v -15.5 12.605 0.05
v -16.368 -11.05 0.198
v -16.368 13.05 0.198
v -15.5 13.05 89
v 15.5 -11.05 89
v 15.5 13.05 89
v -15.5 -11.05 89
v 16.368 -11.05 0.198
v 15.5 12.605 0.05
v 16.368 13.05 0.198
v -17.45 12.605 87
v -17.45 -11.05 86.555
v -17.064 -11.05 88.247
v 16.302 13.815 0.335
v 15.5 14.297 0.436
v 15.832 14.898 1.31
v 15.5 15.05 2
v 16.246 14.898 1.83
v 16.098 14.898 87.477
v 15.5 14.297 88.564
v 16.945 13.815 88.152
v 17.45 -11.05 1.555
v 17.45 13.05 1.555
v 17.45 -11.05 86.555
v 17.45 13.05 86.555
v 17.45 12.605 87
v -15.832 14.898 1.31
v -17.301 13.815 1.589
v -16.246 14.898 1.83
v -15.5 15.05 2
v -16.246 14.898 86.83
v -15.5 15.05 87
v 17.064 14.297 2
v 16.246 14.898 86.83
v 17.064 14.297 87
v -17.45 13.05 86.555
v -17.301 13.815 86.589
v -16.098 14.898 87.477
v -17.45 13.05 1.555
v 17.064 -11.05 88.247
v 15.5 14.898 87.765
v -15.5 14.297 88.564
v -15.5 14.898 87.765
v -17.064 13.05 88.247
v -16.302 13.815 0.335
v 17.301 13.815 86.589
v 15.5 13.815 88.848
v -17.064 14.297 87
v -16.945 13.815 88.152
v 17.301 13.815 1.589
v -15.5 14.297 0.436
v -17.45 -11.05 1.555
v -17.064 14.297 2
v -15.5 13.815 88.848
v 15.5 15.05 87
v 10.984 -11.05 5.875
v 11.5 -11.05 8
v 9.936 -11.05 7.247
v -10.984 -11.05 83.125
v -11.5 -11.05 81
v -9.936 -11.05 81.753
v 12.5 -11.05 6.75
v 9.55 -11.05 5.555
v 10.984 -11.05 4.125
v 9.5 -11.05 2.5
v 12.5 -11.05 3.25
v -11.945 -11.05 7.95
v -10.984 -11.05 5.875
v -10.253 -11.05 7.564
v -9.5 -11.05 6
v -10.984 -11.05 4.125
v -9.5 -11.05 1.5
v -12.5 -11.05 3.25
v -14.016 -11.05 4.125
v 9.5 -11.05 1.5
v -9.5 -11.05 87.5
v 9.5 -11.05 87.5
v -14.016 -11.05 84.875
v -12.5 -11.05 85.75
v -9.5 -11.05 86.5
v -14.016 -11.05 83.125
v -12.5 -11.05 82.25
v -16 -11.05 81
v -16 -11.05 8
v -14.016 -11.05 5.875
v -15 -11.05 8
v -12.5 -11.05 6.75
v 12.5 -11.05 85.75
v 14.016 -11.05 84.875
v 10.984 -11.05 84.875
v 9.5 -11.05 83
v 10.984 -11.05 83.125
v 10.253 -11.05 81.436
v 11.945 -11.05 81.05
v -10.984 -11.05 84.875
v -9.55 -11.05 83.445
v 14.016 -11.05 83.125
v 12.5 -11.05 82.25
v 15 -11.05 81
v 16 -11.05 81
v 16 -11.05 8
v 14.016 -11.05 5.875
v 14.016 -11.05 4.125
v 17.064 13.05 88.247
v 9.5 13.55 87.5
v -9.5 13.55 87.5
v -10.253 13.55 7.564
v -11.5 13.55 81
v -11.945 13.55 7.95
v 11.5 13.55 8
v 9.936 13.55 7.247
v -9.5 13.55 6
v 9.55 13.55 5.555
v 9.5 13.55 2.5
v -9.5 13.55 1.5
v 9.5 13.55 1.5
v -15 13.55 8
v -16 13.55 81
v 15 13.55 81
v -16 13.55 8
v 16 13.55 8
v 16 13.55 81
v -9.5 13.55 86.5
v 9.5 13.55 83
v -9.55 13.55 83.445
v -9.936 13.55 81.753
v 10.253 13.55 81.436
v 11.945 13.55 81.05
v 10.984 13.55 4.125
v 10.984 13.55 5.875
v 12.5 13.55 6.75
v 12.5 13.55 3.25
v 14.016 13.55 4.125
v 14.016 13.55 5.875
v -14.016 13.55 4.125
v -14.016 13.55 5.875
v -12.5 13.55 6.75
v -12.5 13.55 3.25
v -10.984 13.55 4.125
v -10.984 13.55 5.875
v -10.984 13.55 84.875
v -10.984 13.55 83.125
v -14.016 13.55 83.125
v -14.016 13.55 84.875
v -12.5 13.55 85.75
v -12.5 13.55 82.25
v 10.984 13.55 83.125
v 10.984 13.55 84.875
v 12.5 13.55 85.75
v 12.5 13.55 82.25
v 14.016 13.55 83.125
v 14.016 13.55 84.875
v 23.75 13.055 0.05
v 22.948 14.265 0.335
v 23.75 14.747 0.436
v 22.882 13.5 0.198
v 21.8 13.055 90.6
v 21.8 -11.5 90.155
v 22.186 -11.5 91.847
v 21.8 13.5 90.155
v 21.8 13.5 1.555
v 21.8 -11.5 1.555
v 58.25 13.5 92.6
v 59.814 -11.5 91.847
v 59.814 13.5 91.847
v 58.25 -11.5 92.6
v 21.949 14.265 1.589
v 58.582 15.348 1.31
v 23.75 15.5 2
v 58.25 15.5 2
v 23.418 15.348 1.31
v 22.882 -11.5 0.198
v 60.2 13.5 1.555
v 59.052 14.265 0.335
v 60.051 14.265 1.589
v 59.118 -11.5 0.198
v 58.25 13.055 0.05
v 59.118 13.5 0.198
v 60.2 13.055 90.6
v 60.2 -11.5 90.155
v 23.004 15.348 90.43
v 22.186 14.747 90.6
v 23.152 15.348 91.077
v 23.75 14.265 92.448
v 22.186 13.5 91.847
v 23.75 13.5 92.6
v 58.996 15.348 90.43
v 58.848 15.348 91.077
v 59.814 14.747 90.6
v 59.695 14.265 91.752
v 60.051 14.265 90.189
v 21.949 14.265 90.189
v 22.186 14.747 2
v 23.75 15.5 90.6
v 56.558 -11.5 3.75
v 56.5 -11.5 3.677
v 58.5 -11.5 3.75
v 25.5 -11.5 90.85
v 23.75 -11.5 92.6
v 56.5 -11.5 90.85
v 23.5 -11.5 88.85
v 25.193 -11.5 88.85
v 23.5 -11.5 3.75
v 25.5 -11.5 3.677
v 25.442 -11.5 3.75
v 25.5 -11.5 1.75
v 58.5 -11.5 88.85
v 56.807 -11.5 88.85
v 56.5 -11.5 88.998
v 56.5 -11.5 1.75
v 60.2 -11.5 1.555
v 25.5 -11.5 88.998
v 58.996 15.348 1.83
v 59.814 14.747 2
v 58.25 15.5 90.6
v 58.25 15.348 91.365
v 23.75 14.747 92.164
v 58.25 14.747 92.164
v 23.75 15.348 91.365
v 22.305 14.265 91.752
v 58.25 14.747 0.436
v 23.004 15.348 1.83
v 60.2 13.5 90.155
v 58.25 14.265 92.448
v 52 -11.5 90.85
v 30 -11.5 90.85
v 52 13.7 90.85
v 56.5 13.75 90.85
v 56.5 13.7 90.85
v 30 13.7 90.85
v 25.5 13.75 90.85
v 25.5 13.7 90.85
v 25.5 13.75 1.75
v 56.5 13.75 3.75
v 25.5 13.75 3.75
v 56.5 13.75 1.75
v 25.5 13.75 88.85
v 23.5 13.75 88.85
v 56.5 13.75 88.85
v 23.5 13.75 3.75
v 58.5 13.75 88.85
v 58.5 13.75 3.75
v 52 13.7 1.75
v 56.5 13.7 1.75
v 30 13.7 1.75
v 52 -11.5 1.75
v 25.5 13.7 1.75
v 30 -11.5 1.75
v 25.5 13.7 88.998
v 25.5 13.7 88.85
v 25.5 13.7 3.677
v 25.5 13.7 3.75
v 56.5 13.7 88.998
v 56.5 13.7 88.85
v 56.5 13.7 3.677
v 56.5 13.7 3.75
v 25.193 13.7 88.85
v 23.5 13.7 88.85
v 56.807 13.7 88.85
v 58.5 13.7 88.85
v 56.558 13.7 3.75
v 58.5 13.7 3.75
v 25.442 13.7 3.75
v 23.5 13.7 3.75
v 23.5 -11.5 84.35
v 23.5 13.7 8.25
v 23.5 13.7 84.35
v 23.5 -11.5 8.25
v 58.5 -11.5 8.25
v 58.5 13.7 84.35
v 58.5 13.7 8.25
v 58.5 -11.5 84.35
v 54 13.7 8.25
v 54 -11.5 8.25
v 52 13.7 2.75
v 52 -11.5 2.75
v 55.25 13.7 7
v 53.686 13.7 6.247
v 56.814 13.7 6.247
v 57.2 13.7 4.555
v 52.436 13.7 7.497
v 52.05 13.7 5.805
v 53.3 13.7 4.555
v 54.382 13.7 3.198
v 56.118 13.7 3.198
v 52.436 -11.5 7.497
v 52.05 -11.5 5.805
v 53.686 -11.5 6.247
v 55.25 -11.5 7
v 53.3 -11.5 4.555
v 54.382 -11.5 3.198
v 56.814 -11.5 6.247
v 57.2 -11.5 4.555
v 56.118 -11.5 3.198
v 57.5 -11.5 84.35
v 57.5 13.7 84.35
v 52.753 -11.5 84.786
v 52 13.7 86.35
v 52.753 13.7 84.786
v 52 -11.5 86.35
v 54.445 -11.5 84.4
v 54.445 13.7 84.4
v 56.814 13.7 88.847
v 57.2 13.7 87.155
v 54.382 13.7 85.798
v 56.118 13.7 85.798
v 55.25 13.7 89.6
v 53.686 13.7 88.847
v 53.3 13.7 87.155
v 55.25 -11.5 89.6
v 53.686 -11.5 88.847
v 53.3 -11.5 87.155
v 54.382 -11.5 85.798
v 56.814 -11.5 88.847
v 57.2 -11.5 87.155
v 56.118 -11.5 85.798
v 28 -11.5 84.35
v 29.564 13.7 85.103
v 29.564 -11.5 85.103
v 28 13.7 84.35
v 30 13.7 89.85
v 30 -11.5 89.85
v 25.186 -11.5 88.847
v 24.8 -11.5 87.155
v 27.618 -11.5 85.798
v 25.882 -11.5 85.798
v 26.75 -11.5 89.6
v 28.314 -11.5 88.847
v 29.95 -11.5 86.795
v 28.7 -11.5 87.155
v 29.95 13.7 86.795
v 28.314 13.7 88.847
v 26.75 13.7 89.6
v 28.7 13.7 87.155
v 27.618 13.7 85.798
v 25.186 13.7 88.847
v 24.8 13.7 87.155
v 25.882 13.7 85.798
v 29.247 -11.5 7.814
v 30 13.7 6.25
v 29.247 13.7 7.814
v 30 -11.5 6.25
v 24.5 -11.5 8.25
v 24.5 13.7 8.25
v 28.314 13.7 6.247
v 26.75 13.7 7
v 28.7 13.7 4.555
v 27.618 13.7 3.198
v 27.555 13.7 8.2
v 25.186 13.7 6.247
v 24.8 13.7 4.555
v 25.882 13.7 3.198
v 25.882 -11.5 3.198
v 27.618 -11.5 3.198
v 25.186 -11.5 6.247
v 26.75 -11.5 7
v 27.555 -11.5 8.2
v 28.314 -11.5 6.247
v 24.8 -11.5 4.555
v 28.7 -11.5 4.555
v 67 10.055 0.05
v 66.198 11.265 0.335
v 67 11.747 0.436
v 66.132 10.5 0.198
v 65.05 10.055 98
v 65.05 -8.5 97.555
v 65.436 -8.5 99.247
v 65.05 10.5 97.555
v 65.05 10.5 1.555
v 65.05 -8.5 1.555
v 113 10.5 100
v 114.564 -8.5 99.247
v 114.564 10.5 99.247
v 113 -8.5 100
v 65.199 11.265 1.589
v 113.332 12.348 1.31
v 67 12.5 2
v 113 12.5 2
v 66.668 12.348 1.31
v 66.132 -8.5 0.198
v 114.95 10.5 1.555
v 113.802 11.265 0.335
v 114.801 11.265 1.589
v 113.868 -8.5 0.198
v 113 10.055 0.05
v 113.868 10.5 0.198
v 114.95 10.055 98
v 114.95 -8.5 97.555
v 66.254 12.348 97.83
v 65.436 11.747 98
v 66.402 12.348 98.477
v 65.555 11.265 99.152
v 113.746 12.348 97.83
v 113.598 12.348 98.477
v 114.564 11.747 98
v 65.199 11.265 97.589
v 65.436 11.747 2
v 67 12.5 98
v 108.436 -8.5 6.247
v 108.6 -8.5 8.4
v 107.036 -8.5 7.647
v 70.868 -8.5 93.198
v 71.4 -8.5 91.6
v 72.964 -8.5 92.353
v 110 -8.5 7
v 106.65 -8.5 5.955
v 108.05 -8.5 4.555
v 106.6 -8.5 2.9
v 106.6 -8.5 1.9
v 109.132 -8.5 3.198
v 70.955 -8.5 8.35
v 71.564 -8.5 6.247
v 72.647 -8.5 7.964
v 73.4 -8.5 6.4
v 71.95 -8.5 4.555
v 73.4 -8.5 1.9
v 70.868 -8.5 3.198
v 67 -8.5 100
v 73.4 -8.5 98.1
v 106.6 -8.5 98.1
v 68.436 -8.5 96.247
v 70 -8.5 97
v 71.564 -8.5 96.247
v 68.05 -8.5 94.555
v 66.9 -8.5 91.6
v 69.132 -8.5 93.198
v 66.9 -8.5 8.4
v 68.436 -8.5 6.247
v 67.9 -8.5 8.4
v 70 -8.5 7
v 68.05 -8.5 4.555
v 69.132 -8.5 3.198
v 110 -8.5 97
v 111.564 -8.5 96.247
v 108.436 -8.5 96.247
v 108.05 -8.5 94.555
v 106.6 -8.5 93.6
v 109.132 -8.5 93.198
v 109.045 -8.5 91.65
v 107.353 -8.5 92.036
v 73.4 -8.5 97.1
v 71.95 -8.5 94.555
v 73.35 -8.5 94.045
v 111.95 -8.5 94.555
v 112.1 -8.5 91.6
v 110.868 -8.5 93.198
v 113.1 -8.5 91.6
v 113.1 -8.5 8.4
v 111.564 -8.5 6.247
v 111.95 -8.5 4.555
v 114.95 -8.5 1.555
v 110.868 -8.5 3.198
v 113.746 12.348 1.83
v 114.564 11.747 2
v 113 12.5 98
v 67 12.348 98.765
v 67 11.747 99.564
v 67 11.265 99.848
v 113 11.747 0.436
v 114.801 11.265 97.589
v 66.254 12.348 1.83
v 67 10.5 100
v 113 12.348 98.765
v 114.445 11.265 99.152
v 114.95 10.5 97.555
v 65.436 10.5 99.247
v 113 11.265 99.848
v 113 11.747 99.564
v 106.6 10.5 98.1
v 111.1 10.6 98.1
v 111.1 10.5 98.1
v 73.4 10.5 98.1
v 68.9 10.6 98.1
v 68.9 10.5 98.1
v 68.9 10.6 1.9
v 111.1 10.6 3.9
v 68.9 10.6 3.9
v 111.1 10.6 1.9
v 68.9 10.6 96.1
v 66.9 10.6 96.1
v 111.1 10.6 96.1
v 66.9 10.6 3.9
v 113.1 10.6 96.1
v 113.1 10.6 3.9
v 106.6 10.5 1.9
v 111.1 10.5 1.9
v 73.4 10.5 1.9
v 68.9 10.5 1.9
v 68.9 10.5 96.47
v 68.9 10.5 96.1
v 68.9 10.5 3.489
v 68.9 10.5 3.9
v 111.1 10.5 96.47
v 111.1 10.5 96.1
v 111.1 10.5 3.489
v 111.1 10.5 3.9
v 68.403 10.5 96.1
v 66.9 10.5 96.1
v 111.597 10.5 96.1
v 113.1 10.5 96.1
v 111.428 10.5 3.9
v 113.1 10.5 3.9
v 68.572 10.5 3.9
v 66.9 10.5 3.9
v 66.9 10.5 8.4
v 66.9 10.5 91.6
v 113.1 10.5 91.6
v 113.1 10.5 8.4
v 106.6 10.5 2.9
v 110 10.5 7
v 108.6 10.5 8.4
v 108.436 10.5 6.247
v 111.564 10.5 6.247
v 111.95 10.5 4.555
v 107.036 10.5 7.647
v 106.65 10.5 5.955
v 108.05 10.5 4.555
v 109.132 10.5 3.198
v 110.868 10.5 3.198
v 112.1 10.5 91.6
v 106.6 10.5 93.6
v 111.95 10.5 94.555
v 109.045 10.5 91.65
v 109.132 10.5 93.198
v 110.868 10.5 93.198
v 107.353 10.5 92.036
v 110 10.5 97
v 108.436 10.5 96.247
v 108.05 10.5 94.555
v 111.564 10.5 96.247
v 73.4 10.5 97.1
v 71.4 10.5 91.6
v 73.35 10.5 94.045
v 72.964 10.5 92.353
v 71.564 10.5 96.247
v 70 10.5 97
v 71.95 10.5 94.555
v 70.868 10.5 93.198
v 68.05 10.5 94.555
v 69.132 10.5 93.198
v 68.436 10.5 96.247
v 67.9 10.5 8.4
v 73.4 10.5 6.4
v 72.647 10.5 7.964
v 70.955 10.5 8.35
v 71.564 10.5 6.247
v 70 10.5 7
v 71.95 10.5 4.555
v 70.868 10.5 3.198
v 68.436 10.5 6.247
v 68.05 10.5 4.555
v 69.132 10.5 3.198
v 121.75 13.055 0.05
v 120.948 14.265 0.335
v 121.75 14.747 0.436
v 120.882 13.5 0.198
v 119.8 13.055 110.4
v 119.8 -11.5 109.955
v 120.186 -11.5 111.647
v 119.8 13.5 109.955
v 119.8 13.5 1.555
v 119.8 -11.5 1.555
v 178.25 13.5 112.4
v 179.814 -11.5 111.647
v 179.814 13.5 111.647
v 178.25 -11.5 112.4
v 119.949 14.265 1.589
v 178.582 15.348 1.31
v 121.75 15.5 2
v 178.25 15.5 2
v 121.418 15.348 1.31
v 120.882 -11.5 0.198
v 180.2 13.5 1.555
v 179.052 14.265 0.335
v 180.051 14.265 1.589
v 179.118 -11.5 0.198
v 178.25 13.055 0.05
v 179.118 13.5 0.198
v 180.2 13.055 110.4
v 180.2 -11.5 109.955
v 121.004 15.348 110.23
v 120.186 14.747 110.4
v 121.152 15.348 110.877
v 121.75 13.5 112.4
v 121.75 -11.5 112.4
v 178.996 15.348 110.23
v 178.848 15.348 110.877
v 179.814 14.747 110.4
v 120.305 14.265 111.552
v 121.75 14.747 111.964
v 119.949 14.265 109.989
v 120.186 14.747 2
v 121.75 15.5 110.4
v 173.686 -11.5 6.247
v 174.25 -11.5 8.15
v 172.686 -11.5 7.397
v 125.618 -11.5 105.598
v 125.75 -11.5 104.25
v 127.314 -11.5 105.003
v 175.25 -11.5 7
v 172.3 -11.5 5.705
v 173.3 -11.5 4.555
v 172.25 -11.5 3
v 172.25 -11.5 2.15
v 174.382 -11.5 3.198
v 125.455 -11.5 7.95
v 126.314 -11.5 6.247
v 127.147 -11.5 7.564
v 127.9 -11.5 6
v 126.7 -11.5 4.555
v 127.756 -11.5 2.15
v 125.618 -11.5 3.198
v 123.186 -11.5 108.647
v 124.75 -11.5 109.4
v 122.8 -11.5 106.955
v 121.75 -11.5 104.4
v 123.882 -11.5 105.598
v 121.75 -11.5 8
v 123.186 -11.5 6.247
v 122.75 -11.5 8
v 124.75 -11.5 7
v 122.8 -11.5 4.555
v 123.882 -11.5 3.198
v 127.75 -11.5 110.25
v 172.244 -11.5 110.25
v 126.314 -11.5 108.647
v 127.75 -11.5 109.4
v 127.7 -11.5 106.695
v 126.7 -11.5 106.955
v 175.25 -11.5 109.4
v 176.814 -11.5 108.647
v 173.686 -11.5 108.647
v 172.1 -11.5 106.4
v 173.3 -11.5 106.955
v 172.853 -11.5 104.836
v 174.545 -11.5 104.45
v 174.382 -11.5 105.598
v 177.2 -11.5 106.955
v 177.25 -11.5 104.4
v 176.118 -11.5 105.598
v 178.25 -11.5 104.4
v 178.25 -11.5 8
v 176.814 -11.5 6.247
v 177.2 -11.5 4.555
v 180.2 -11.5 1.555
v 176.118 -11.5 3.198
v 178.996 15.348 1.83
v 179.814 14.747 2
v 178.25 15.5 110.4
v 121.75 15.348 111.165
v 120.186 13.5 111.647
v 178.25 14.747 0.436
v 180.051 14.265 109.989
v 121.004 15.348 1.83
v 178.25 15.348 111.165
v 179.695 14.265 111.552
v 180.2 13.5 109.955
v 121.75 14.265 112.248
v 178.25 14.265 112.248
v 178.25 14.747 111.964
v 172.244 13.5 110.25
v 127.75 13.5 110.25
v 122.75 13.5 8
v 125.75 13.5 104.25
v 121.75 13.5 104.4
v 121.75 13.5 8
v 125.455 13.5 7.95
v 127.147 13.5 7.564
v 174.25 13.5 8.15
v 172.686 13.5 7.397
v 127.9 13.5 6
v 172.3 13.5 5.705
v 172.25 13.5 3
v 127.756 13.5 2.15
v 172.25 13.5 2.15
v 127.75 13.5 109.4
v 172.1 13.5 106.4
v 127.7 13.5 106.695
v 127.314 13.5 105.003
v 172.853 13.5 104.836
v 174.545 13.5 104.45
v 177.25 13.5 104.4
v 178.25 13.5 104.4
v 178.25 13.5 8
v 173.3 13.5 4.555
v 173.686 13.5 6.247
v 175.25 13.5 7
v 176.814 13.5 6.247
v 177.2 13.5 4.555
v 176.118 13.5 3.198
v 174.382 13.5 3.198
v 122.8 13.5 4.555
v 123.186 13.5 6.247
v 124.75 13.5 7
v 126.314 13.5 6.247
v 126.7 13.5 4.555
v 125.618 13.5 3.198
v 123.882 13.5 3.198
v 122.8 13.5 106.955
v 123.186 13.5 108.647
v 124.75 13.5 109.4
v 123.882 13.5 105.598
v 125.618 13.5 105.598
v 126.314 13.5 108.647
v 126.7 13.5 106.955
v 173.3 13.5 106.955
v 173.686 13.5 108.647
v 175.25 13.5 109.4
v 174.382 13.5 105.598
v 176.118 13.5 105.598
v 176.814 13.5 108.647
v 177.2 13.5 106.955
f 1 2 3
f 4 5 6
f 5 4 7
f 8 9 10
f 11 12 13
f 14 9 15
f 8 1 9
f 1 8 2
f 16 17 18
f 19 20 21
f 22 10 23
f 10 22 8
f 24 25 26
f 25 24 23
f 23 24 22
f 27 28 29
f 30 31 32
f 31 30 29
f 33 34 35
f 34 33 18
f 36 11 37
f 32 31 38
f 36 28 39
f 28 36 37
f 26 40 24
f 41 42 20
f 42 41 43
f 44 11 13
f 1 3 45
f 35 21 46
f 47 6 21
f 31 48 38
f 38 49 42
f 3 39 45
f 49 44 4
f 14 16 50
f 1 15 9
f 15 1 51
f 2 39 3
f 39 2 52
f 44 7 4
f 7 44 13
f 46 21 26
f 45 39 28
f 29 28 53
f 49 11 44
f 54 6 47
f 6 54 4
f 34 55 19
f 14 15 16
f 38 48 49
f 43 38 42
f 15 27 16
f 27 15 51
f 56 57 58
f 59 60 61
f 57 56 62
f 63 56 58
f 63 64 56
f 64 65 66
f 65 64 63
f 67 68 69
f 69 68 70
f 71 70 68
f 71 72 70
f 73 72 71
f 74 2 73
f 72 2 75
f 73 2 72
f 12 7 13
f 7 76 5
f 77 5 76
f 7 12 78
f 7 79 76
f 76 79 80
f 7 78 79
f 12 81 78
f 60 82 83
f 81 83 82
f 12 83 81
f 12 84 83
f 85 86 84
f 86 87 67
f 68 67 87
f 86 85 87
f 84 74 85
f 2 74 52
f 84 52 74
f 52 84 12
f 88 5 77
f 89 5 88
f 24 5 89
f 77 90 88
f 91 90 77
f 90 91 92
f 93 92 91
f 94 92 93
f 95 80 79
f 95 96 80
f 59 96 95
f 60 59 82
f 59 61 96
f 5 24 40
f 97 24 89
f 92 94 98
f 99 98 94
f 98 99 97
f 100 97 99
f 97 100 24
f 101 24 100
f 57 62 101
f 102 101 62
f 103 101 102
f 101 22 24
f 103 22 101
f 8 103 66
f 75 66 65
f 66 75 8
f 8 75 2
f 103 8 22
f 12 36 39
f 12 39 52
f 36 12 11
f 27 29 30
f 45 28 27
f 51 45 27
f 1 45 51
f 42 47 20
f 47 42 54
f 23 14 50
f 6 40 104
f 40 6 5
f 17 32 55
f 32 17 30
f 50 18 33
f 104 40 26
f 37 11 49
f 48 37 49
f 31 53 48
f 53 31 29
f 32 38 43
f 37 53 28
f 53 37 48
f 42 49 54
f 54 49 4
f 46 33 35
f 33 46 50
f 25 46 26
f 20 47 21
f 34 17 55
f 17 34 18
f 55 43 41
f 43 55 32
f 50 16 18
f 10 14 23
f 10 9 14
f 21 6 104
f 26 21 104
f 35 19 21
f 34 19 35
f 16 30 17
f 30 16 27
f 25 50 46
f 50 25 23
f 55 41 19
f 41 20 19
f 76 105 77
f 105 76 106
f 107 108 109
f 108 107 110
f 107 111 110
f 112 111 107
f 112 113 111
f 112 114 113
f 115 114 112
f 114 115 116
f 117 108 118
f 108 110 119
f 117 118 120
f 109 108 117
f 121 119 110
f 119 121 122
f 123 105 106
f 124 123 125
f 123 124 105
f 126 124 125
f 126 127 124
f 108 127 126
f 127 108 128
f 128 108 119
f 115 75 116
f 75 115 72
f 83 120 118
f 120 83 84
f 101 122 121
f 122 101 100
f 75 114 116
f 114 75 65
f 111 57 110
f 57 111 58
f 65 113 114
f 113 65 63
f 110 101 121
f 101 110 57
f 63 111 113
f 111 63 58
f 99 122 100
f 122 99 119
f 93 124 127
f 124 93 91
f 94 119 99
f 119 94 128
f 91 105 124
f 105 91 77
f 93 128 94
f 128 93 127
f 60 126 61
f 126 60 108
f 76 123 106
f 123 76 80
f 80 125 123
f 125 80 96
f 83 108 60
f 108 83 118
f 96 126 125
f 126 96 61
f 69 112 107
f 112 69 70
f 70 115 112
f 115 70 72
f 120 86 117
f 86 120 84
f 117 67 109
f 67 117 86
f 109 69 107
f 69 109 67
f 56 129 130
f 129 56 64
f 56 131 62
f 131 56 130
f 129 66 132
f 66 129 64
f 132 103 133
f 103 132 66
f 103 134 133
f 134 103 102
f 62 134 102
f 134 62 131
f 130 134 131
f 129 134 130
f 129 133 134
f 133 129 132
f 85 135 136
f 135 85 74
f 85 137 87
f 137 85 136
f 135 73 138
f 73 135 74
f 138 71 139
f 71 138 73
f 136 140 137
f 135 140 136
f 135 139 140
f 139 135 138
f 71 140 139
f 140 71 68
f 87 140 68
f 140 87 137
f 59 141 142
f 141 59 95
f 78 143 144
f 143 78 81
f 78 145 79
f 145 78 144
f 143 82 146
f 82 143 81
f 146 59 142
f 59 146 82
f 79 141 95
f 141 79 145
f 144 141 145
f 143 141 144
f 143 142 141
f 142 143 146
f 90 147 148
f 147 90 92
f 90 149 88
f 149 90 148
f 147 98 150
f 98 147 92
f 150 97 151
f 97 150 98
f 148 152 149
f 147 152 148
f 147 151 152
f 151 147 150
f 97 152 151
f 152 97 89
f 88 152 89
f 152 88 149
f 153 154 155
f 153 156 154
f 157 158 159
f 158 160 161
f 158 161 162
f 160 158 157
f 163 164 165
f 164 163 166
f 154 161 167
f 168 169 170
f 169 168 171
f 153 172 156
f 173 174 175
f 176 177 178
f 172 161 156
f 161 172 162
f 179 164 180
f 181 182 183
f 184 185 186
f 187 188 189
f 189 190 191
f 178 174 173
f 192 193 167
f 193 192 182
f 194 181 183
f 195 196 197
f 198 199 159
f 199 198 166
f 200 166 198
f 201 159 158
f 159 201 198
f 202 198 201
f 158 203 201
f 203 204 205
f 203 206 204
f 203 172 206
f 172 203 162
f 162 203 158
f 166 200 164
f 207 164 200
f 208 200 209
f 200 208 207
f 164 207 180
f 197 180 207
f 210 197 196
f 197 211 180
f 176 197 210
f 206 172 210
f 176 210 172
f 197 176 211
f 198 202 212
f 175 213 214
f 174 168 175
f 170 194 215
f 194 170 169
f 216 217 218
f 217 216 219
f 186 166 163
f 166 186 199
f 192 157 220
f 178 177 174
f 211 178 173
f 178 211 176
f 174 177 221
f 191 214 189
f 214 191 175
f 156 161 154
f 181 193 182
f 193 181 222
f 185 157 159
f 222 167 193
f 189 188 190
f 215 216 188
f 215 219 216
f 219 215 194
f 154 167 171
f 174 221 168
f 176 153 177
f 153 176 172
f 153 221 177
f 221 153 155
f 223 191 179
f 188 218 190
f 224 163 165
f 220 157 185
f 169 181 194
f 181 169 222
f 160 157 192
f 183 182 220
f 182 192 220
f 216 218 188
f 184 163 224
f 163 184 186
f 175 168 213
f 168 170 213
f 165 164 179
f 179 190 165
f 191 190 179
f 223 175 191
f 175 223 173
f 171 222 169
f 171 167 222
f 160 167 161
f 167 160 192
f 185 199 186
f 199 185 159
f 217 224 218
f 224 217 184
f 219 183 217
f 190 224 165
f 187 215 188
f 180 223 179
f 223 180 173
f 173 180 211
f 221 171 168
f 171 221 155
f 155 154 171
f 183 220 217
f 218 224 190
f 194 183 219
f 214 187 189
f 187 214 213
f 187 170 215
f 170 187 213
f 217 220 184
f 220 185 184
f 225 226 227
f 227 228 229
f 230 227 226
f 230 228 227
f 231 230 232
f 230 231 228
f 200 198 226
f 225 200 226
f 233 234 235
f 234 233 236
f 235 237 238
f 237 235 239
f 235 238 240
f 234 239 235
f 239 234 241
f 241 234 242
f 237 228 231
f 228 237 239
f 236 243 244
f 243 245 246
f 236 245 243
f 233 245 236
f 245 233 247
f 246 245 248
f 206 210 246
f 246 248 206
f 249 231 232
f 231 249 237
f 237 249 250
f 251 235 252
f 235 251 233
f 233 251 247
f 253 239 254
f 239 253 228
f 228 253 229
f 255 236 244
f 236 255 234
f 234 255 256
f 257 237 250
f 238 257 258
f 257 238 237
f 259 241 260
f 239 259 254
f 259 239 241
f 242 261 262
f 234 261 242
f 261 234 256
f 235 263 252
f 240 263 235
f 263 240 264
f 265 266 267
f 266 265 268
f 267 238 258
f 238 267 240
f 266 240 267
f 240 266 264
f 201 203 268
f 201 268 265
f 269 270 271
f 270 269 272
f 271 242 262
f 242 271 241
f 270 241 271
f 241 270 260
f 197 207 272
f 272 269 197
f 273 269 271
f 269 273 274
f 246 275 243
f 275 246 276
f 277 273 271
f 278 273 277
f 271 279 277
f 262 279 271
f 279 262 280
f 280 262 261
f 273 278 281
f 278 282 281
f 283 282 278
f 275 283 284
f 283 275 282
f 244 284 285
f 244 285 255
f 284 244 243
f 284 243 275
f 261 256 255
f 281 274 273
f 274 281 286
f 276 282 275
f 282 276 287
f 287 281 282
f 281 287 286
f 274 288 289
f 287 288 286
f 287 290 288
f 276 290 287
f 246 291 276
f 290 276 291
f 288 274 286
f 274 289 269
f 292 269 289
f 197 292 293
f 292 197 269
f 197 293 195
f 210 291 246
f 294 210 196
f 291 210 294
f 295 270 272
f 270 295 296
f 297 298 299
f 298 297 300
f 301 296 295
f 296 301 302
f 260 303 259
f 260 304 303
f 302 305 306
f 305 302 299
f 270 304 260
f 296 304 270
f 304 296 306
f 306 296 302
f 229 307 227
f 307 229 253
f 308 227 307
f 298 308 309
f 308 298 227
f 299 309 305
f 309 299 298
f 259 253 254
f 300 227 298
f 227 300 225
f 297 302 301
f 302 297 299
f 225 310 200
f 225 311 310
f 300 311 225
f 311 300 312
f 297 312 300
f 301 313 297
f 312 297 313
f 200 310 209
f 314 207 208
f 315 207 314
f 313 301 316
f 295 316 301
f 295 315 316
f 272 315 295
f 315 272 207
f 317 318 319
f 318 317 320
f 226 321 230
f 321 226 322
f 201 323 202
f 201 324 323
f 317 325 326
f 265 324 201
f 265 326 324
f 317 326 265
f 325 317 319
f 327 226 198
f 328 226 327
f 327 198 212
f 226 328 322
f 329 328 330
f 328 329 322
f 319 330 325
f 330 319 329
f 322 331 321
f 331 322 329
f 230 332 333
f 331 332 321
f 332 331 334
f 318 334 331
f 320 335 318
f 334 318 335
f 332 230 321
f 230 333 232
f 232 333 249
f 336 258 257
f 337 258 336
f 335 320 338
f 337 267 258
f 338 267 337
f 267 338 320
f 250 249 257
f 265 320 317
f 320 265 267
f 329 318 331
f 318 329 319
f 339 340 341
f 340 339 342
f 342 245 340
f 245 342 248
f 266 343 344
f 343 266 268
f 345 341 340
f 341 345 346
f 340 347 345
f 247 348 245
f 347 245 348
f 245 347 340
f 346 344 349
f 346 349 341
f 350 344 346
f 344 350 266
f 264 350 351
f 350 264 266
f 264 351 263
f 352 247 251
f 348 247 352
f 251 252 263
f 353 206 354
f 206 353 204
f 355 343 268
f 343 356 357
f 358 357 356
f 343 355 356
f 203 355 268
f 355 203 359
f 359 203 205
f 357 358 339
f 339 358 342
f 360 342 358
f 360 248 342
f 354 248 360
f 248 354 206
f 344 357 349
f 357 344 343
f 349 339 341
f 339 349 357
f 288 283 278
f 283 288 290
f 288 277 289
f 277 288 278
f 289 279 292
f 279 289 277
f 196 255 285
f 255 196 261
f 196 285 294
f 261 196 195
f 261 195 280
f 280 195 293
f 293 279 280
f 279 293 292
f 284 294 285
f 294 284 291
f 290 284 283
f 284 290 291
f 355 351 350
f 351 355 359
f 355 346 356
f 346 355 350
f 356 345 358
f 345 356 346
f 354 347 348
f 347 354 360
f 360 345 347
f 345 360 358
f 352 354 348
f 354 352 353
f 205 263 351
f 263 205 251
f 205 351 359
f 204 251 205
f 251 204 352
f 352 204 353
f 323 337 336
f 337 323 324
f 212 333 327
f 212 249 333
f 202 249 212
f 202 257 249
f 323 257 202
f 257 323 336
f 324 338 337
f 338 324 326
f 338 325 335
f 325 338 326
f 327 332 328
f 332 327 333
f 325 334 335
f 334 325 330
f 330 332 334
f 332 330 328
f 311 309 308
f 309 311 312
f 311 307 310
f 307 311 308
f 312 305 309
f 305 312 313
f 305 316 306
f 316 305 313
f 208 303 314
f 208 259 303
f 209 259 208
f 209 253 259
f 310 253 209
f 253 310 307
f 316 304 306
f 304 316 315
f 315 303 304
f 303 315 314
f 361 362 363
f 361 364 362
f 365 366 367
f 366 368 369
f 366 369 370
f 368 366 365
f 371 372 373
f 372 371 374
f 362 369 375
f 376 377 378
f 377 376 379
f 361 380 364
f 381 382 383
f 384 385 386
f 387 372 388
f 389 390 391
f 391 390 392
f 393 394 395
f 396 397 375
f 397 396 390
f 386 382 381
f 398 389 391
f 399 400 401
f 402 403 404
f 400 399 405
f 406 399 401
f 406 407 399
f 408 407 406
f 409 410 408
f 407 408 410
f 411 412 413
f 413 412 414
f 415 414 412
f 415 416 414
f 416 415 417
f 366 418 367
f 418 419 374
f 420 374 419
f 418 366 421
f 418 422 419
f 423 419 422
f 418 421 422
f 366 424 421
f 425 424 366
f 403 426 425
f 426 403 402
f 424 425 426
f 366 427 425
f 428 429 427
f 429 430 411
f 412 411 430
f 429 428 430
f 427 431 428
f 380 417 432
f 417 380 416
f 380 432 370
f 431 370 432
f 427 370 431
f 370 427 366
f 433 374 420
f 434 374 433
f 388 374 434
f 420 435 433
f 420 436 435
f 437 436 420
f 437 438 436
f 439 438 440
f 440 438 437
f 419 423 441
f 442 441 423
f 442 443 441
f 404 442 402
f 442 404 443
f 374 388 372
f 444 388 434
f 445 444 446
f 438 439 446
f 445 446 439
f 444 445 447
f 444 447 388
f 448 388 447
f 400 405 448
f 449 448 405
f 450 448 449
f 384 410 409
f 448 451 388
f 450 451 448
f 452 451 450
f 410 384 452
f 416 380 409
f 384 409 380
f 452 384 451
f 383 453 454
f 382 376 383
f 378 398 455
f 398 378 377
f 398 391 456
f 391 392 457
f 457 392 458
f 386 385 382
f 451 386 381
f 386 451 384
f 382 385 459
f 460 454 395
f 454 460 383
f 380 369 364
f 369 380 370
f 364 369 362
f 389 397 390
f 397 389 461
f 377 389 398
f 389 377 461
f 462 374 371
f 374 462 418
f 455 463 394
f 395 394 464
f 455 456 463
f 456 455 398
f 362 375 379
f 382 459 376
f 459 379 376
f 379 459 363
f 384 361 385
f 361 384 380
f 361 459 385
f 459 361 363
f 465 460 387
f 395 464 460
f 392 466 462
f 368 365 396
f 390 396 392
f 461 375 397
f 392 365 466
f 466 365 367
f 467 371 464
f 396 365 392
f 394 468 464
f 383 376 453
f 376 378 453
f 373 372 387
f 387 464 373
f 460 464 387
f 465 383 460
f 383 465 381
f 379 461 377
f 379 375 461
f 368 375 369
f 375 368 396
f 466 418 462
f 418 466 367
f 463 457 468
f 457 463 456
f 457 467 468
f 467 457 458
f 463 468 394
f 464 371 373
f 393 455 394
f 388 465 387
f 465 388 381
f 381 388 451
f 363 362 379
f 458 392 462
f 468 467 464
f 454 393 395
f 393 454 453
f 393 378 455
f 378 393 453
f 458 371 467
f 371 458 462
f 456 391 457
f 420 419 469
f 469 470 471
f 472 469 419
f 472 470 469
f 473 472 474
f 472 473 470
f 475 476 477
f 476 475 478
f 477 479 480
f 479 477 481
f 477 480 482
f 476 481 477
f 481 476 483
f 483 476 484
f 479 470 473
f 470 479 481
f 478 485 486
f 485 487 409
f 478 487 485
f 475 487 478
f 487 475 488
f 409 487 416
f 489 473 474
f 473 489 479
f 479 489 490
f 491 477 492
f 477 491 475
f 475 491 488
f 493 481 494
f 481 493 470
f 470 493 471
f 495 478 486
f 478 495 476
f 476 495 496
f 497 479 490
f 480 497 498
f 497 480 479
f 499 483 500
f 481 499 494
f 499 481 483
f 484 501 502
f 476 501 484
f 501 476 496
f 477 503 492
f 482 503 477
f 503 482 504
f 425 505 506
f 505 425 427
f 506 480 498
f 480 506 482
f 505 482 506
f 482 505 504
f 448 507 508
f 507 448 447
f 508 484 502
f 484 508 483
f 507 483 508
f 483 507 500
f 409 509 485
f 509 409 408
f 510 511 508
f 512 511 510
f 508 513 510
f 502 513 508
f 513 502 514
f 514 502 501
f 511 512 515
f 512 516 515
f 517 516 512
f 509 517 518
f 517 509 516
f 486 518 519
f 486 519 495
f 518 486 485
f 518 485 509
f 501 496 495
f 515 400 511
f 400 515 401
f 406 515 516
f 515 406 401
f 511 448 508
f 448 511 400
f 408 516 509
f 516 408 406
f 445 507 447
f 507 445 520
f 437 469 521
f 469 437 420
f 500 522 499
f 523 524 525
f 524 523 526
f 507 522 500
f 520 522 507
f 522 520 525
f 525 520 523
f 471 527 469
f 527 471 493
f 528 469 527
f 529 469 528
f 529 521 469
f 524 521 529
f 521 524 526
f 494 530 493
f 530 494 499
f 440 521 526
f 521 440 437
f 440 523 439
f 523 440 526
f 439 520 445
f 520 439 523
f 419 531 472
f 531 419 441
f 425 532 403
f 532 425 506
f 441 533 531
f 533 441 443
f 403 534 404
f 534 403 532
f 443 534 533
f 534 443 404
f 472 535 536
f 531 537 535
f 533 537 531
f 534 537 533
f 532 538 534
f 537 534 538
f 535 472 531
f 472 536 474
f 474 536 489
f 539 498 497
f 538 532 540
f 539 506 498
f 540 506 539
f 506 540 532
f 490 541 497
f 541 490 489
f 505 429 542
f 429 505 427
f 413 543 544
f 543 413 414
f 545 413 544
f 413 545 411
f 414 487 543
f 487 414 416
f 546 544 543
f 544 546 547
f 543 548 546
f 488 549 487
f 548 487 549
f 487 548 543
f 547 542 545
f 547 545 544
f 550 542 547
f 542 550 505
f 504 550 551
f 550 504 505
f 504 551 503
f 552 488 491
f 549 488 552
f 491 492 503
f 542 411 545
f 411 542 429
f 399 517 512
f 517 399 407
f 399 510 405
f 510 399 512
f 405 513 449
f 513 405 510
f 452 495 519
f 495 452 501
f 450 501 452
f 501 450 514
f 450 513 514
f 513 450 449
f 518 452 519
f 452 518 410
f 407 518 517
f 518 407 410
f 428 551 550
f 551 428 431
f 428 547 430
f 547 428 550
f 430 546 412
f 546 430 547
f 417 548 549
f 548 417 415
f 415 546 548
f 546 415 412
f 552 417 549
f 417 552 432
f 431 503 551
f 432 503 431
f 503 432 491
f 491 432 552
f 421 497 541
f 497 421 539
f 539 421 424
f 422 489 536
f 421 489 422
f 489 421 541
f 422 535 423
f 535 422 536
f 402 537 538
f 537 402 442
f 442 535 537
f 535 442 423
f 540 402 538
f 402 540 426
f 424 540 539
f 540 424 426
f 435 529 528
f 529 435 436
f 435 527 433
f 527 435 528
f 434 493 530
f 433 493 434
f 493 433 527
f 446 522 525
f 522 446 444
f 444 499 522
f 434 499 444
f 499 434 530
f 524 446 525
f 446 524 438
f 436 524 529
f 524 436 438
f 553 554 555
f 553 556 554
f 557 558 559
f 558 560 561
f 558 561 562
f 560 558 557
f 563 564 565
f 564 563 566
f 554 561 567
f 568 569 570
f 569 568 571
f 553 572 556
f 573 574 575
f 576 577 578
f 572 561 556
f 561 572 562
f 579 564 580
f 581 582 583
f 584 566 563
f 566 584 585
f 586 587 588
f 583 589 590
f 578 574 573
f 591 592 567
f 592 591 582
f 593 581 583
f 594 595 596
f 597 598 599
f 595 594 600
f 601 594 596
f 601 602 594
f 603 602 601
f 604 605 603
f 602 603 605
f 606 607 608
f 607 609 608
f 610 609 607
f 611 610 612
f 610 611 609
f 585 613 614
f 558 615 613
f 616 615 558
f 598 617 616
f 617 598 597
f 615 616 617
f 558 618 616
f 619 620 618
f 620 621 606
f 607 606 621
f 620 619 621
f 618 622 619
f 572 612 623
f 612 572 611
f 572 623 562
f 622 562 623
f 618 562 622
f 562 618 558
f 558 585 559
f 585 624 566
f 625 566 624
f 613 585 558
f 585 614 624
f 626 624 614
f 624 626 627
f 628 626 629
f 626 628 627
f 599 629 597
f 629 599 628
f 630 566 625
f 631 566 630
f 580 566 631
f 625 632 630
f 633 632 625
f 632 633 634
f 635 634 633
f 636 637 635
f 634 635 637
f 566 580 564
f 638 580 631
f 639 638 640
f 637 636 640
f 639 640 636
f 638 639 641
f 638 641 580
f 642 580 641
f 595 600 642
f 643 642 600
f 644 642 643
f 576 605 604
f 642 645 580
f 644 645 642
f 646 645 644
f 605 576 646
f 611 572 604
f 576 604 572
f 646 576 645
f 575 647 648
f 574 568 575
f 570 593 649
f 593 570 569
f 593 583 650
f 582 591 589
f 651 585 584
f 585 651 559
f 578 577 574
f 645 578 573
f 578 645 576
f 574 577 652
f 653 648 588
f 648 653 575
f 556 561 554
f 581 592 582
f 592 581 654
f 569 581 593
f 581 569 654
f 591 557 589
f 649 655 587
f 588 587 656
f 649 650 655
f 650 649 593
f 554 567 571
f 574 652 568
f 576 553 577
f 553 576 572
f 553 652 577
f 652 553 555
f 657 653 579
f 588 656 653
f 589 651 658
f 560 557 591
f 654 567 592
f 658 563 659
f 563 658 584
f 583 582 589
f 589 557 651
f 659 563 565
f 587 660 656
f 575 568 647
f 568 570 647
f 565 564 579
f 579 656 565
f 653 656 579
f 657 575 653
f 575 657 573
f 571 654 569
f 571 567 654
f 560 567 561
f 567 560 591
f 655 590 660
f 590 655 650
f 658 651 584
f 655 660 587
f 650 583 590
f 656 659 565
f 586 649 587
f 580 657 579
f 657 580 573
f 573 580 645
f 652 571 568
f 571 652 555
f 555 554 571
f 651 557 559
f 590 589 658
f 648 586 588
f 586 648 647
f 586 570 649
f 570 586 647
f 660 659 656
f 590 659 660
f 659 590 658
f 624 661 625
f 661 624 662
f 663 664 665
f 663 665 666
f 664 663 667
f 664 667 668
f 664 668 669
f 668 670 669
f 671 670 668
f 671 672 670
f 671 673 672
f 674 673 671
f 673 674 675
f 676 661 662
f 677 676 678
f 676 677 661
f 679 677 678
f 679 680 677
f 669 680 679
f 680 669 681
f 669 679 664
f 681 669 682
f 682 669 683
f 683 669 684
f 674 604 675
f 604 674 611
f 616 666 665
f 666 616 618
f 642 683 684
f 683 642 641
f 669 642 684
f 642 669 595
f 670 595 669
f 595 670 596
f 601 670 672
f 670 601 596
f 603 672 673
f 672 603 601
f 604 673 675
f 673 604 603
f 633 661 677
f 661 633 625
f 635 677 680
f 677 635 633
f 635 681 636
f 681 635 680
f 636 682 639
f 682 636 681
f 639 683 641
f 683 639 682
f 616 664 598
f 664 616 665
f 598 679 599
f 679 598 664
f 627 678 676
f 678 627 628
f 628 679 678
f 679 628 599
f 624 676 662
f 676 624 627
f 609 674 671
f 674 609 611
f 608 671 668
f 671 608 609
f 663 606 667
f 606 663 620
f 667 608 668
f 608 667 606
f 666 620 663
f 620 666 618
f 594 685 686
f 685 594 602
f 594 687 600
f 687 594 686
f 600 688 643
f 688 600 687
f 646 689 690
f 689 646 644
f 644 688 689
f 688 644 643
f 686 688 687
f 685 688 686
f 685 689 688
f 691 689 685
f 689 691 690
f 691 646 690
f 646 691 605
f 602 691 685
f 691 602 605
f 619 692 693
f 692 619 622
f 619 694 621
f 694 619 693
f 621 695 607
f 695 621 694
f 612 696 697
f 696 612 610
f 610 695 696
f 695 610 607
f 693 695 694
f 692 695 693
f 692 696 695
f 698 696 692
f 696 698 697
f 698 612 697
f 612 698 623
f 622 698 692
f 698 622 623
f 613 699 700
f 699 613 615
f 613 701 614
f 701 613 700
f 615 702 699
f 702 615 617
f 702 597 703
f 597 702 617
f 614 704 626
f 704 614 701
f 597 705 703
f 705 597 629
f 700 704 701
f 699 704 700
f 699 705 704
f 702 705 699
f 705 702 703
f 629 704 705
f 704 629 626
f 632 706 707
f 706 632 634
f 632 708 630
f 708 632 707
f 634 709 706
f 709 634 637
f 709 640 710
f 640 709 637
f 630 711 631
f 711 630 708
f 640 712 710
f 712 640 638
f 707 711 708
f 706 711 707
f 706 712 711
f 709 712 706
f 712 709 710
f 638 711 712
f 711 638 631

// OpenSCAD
// file: enclosure.scad
/**
 * Available enclosures:
 *
 * Hammond:
 * + http://www.hammondmfg.com/pdf/1550A.pdf
 * + http://www.hammondmfg.com/pdf/1590A.pdf
 * + http://www.hammondmfg.com/pdf/1590B.pdf
 * + http://www.hammondmfg.com/pdf/1590G.pdf
 */
 //$fn = 36;
 
//enclosure("hammond1550a", "both", "grey");
//enclosure("hammond1590a", "both", "grey");
//enclosure("hammond1590b", "both", "grey");
//enclosure("hammond1590g", "both", "grey");
 
module enclosure(type, part, boxColor) {
  if(type == "hammond1550a")
    hammond1550a(part, boxColor);

  if(type == "hammond1590a")
    hammond1590a(part, boxColor);

  if(type == "hammond1590b")
    hammond1590b(part, boxColor);

  if(type == "hammond1590g")
    hammond1590g(part, boxColor);
}

module hammond1550a(part="both", boxColor="grey") {
  outerLength = 89;
  outerWidth = 35;
  outerHeight = 30.1;
  lidHeight = 4;

  innerLength = 86;
  innerWidth = 32;
  innerHeight = 27.1;

  postWidth = 6.5;
  holeDiameter = 3.5;

  xOffsetHole = 5;
  yOffsetHole = 5;

  outerDiameter = 4;

  hammond(
    outerLength, outerWidth, outerHeight, lidHeight,
    innerLength, innerWidth, innerHeight,
    postWidth, holeDiameter, xOffsetHole, yOffsetHole,
    outerDiameter,
    part, boxColor);
}

module hammond1590a(part="both", boxColor="grey") {
  outerLength = 92.6;
  outerWidth = 38.5;
  outerHeight = 31;
  lidHeight = 4;

  innerLength = 89.10;
  innerWidth = 35;
  innerHeight = 27.4;

  postWidth = 6.5;
  holeDiameter = 4;

  xOffsetHole = 5;
  yOffsetHole = 5;

  outerDiameter = 4;

  hammond(
    outerLength, outerWidth, outerHeight, lidHeight,
    innerLength, innerWidth, innerHeight,
    postWidth, holeDiameter, xOffsetHole, yOffsetHole,
    outerDiameter,
    part, boxColor);
}

module hammond1590b(part="both", boxColor="grey") {
  outerLength = 112.4;
  outerWidth = 60.5;
  outerHeight = 31;
  lidHeight = 4;

  innerLength = 108.1;
  innerWidth = 56.5;
  innerHeight = 27;

  postWidth = 6;
  holeDiameter = 4;

  xOffsetHole = 5;
  yOffsetHole = 5;

  outerDiameter = 4;

  hammond(
    outerLength, outerWidth, outerHeight, lidHeight,
    innerLength, innerWidth, innerHeight,
    postWidth, holeDiameter, xOffsetHole, yOffsetHole,
    outerDiameter,
    part, boxColor);
}

module hammond1590g(part="both", boxColor="grey") {
  outerLength = 100;
  outerWidth = 50;
  outerHeight = 25;
  lidHeight = 4;

  innerLength = 96.2;
  innerWidth = 46.2;
  innerHeight = 21;

  postWidth = 6.5;
  holeDiameter = 4;

  xOffsetHole = 5;
  yOffsetHole = 5;

  outerDiameter = 4;

  hammond(
    outerLength, outerWidth, outerHeight, lidHeight,
    innerLength, innerWidth, innerHeight,
    postWidth, holeDiameter, xOffsetHole, yOffsetHole,
    outerDiameter,
    part, boxColor);
}

module hammond(
  outerLength, outerWidth, outerHeight, lidHeight,
  innerLength, innerWidth, innerHeight,
  postWidth, holeDiameter, xOffsetHole, yOffsetHole,
  outerDiameter,
  part, boxColor)
{
  holeRadius = holeDiameter / 2;
  outerRadius = outerDiameter / 2;
  bodyHeight = outerHeight - lidHeight;

  xOffset = (outerLength - innerLength) / 2;
  yOffset = (outerWidth - innerWidth) / 2;
  zOffset = (outerHeight - innerHeight) / 2;

  xOffsetLid = outerWidth / 2;
  yOffsetLid = -(bodyHeight + lidHeight) / 2;
  zOffsetLid = outerLength;
  posLid = [xOffsetLid, yOffsetLid, zOffsetLid];
  rotLid = [0, 90, 90];

  xOffsetBody = outerWidth / 2;
  yOffsetBody = (bodyHeight + lidHeight) / 2;
  zOffsetBody = 0;
  posBody = [xOffsetBody, yOffsetBody, zOffsetBody];
  rotBody = [0, 270, 90];

  if(part == "both") {
    translate(posBody)
      rotate(rotBody)
        color(boxColor) body();

    translate(posLid)
      rotate(rotLid)
        %lid();
  }

  if(part == "body")
    translate(posBody)
      rotate(rotBody)
        color(boxColor) body();

  if(part == "lid")
    translate(posLid)
      rotate(rotLid)
        color(boxColor) lid();

  module lid() {
    group() {
      difference() {
        union() {
          roundedBody(lidHeight);
          translate([0, 0, zOffset])
            screwPosts(lidHeight - zOffset);
        }

        translate([0, 0, zOffset])
          screwHoles(lidHeight - zOffset);
      }

      cube(0); // So wer are able to group
    }
  }

  module body() {
    group() {
      difference() {
        group() {
          roundedBody(bodyHeight);
          translate([0, 0, zOffset])
            screwPosts(bodyHeight - zOffset);
        }

        translate([0, 0, zOffset])
          screwHoles(bodyHeight - zOffset);
      }

      cube(0); // So wer are able to group
    }
  }

  module roundedBody(height) {
    zOffset = (height - innerHeight);
    columnsXLength = outerWidth - outerRadius * 2;
    columnsYLength = outerLength - outerRadius * 2;
    columnsZLength = height - outerRadius;
    columnsX = [
      [outerRadius, outerRadius, outerRadius],
      [outerLength - outerRadius, outerRadius, outerRadius]
    ];
    columnsY = [
      [outerRadius, outerRadius, outerRadius],
      [outerRadius, outerWidth - outerRadius, outerRadius]
    ];
    columnsZ = [
      [outerRadius, outerRadius, outerRadius],
      [outerRadius, outerWidth - outerRadius, outerRadius],
      [outerLength - outerRadius, outerWidth - outerRadius, outerRadius],
      [outerLength - outerRadius, outerRadius, outerRadius]
    ];
    corners = [
      [outerRadius, outerRadius, outerRadius],
      [outerRadius, outerWidth - outerRadius, outerRadius],
      [outerLength - outerRadius, outerRadius, outerRadius],
      [outerLength - outerRadius, outerWidth - outerRadius, outerRadius]
    ];

    difference() {
      hull() {
        for(pos = columnsZ)
          translate(pos)
            cylinder(r=outerRadius, h=columnsZLength);

        for(pos = columnsX)
          translate(pos)
            rotate([270,90,0])
              cylinder(r=outerRadius, h=columnsXLength);

        for(pos = columnsY)
          translate(pos)
            rotate([0,90,0])
              cylinder(r=outerRadius, h=columnsYLength);

        for(pos = corners)
          translate(pos)
            sphere(r=outerRadius);
      }

      translate([xOffset, yOffset + outerDiameter / 2, yOffset])
        cube([innerLength, innerWidth - outerDiameter, innerHeight + 1]);

      translate([xOffset + outerDiameter / 2, yOffset, yOffset])
        cube([innerLength - outerDiameter, innerWidth, innerHeight + 1]);
    }
  }
    
  module screwPost(height) {
    xOffsetRadius = xOffset + postWidth - outerRadius;
    yOffsetRadius = yOffset + postWidth - outerRadius;

    hull() {
      translate([min(xOffset, yOffset), min(xOffset, yOffset), 0]) {
        cube([postWidth, 1, height]);
        cube([1, postWidth, height]);
      }

      translate([xOffsetRadius, yOffsetRadius, 0])
        cylinder(r=outerRadius, h=height);
    }
  }
    
  module screwPosts(height) {
    posts = [
      [0, 0, 0],
      [outerLength, 0, 0],
      [outerLength, outerWidth, 0],
      [0, outerWidth, 0]
    ];

    group() {
      for(i = [0:3])
        translate(posts[i])
          rotate([0, 0, 90 * i])
            screwPost(height);
    }
  }

  module screwHoles(height) {
    holes = [
      [xOffsetHole, yOffsetHole, 0],
      [xOffsetHole, outerWidth - yOffsetHole, 0],
      [outerLength - xOffsetHole, outerWidth - yOffsetHole, 0],
      [outerLength - xOffsetHole, yOffsetHole, 0]
    ];

    group() {
      for(pos = holes)
        translate(pos)
          cylinder(r=holeRadius, h=height + 1);
    }
  }
}
// main file
include <enclosure.scad>;

enclosure("hammond1550a", "both", "grey");
translate([-0, -60, 0])
  rotate([0, 0, 90])
    color("black") text("1550A");

translate([41, 0, 0]) {
  enclosure("hammond1590a", "both", "grey");
  translate([-0, -60, 0])
    rotate([0, 0, 90])
      color("black") text("1590A");
}

translate([90, 0, 0]) {
  enclosure("hammond1590g", "both", "grey");
  translate([-0, -60, 0])
    rotate([0, 0, 90])
      color("black") text("1590G");
}

translate([150, 0, 0]) {
  enclosure("hammond1590b", "both", "grey");
  translate([-0, -60, 0])
    rotate([0, 0, 90])
      color("black") text("1590B");
}
